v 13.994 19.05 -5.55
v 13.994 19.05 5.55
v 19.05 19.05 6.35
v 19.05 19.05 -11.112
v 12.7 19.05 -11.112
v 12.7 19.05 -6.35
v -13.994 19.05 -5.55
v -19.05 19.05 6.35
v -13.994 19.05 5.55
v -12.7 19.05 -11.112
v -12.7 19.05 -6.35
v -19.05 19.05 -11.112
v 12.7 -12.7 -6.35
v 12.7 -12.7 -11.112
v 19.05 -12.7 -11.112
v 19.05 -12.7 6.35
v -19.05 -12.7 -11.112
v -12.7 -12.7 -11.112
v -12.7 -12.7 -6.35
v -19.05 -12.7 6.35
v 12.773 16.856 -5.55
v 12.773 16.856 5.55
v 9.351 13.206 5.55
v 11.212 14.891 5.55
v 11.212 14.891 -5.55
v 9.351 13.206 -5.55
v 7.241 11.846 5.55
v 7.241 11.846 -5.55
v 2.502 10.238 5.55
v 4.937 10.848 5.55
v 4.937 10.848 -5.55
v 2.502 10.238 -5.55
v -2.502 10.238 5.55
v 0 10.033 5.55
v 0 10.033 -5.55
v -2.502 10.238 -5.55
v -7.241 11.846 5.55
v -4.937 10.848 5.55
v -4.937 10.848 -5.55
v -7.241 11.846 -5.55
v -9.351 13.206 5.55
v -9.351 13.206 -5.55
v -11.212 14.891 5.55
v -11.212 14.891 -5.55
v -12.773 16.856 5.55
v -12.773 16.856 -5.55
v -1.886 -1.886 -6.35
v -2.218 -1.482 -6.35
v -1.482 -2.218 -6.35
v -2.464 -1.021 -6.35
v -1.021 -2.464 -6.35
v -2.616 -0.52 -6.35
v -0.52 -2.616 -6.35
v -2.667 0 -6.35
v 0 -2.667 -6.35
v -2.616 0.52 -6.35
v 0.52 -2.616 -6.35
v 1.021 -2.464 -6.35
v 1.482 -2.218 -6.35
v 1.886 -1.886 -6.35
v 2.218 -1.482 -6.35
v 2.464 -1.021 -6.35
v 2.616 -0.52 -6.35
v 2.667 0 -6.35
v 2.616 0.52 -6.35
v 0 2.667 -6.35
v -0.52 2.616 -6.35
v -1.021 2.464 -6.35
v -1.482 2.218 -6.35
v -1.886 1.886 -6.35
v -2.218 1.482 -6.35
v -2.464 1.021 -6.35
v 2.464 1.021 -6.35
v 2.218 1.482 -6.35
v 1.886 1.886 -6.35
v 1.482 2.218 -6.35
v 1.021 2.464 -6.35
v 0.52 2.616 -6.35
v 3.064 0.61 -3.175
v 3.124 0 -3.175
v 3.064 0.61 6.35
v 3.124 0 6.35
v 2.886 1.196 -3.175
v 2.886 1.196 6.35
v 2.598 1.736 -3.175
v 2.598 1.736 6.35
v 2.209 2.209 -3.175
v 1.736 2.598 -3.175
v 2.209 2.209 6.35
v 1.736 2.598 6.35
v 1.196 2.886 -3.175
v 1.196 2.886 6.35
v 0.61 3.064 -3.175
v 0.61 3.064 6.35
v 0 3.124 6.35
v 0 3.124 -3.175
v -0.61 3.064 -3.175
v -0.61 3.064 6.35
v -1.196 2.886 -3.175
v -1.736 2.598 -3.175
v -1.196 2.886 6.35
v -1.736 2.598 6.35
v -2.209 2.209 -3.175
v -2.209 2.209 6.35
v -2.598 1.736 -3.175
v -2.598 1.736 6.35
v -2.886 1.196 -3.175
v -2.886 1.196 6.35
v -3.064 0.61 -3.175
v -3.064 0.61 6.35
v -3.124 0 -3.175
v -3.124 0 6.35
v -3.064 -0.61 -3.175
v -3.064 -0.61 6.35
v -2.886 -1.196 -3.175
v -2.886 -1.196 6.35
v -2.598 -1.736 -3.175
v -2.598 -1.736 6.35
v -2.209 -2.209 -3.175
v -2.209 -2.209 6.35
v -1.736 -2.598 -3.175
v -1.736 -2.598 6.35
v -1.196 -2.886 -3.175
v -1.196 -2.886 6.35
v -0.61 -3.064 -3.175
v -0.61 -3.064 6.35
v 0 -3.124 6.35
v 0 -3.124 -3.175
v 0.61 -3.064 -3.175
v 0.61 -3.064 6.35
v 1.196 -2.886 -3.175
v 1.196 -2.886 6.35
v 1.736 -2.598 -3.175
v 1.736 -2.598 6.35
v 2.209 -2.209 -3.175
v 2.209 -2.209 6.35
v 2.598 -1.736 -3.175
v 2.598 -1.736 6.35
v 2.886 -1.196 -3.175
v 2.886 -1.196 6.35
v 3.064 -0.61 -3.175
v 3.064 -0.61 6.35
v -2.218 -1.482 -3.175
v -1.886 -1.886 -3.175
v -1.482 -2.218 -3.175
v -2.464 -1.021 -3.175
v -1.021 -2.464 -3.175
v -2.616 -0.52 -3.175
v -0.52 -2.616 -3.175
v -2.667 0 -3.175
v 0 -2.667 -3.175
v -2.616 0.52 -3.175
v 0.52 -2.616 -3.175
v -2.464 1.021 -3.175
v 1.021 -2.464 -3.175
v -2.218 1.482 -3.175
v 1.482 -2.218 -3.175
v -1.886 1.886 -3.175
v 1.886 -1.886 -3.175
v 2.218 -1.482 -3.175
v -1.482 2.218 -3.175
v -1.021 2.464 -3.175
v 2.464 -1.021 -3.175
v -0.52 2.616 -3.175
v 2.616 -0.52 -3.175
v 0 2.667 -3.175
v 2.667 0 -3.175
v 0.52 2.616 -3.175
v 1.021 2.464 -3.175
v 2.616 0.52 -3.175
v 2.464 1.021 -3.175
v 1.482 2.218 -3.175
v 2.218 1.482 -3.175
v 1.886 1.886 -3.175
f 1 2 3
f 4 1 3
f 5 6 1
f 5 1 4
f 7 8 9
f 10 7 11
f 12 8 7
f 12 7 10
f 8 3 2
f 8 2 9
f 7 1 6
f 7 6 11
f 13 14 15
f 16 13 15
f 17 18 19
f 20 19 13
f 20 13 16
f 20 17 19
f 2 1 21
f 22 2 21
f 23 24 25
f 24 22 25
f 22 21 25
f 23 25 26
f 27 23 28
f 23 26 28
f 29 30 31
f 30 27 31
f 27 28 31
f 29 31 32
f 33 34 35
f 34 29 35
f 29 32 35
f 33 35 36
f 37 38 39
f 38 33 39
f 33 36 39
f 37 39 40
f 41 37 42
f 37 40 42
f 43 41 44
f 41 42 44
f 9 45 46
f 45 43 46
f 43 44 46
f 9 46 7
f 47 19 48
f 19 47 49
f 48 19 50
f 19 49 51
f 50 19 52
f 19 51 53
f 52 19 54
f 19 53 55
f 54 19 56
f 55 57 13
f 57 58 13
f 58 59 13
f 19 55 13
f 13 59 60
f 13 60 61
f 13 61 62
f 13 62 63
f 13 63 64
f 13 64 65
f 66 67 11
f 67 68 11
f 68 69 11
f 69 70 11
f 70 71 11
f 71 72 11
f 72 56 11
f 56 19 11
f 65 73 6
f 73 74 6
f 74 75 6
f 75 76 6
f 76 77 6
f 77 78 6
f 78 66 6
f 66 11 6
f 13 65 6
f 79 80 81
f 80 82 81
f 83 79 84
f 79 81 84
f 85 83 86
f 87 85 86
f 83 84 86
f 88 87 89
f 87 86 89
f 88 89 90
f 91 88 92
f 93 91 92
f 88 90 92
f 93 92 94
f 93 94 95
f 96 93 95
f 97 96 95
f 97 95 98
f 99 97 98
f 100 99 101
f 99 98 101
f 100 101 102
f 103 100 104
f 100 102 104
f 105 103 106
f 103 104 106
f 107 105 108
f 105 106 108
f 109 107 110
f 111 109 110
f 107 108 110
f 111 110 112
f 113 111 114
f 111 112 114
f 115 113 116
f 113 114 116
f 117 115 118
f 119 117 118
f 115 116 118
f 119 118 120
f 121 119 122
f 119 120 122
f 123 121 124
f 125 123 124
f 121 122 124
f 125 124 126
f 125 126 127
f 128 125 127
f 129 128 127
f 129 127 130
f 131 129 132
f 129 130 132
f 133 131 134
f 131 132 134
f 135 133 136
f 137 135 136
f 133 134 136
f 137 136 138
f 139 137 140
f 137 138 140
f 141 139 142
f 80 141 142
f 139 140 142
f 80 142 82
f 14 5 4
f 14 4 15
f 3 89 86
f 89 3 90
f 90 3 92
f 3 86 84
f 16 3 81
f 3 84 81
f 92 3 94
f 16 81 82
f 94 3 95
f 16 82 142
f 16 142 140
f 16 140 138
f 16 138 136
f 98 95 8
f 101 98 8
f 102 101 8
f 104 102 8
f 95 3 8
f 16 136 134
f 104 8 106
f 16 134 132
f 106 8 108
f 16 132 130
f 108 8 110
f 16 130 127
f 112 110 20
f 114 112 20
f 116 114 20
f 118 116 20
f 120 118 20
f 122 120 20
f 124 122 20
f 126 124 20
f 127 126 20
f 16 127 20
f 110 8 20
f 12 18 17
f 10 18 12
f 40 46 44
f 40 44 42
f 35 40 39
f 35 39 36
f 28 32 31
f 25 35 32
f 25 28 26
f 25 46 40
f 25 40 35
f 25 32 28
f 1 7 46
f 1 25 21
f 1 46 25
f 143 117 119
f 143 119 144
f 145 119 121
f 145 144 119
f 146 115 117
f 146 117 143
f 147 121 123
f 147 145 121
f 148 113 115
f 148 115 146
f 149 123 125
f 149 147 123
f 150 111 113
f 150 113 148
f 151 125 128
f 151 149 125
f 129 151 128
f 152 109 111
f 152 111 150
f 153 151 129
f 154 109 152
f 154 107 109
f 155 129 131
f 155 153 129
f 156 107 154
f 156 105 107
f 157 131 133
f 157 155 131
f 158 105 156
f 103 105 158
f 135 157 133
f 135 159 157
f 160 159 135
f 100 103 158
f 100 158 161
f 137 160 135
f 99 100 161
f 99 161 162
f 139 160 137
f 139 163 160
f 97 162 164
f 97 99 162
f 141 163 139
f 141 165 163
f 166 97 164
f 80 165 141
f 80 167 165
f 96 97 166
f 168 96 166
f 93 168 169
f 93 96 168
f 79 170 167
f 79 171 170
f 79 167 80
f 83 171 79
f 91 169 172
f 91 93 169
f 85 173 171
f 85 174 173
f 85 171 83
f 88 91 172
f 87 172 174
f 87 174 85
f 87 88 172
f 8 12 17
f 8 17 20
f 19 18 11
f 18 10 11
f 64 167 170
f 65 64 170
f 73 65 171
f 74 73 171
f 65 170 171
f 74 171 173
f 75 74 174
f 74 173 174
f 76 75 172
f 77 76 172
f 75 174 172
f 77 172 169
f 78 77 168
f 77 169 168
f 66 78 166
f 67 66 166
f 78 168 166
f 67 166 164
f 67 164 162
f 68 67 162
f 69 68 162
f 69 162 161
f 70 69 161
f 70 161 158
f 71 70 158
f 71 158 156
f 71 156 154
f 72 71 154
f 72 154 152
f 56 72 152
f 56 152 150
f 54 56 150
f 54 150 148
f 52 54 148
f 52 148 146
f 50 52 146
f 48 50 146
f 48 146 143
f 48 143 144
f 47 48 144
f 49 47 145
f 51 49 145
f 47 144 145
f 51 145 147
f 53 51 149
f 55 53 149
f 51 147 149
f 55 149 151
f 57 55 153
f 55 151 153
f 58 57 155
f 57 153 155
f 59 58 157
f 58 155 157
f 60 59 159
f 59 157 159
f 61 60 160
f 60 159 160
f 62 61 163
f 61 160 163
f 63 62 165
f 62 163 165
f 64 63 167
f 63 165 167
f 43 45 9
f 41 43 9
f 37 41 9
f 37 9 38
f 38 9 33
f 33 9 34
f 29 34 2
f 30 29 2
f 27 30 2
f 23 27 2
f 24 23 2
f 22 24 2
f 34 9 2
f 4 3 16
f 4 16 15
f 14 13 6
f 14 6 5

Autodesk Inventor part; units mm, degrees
ref_plane "YZ Plane" through (0, 0, 0) normal (1, 0, 0) x (0, 1, 0)
ref_plane "XZ Plane" through (0, 0, 0) normal (0, 1, 0) x (-1, 0, 0)
ref_plane "XY Plane" through (0, 0, 0) normal (0, 0, 1) x (1, 0, 0)
sketch "Sketch3" plane through (0, 0, 0) normal (0, 0, 1) x (1, 0, 0)
  line L0 (-12.7, -19.05) -> (12.7, -19.05)
  line L1 (12.7, -19.05) -> (12.7, 19.05)
  line L2 (12.7, 19.05) -> (-12.7, 19.05)
  line L3 (-12.7, 19.05) -> (-12.7, -19.05)
  line L4 (-12.7, -19.05) -> (12.7, 19.05) construction
  line L5 (12.7, -19.05) -> (-12.7, 19.05) construction
  point P0 (0, 0)
  dimension "d0" = 25.4
  dimension "d1" = 38.1
extrude "Extrusion1" add sketch "Sketch3" along normal mid plane 12.7
sketch "Sketch4" plane through (0, 0, 6.35) normal (0, 0, 1) x (1, 0, 0)
  circle A0 centre (0, 0) radius 2.667
  dimension "d4" = 5.334
extrude "Extrusion2" cut sketch "Sketch4" against normal through all
sketch "Sketch5" plane through (-12.7, -19.05, 6.35) normal (-1, 0, 0) x (0, 0, 1)
  line L0 (3.175, 6.35) -> (50.8, 6.35) projected
  line L1 (-12.7, 38.1) -> (-12.7, 0) projected
  line L2 (0, 0) -> (0, 38.1) projected
  line L3 (-12.7, 0) -> (0, 0)
  line L4 (0, 0) -> (0, 6.35)
  line L5 (0, 6.35) -> (-12.7, 6.35)
  line L6 (-12.7, 6.35) -> (-12.7, 0)
  point P0 (-6.35, 19.05)
  point P1 (-12.7, 6.35)
  dimension "d9" = 6.35
extrude "Extrusion3" cut sketch "Sketch5" against normal through all
sketch "Sketch8" plane through (-12.7, -12.7, -6.35) normal (-1, 0, 0) x (0, 0, 1)
  line L0 (-4.7625, 21.8398) -> (-4.7625, 13.2284) projected
  line L1 (12.7, 0) -> (12.7, 31.75) projected
  line L2 (12.7, 0) -> (-4.7625, 0)
  line L3 (-4.7625, 0) -> (-4.7625, 31.75)
  line L4 (-4.7625, 31.75) -> (12.7, 31.75)
  line L5 (12.7, 31.75) -> (12.7, 0)
  point P0 (6.35, 12.7)
  point P1 (-4.7625, 13.2284)
extrude "Extrusion5" add sketch "Sketch8" along normal blind 6.35
mirror "Mirror1" about plane through (0, 0, 0) normal (1, 0, 0) of "Extrusion5"
sketch "Sketch6" plane through (0, 0, 0) normal (0, 0, 1) x (1, 0, 0)
  circle A0 centre (0, 25.4) radius 15.367
  point P0 (0, 0)
  dimension "d10" = 25.4
  dimension "d13" = 30.734
extrude "cutOutForGuide" cut sketch "Sketch6" along normal mid plane 11.0998
sketch "Sketch9" plane through (0, 0, 6.35) normal (0, 0, 1) x (1, 0, 0)
  circle A0 centre (0, 0) radius 3.1242
  dimension "d16" = 6.2484
extrude "Extrusion6" cut sketch "Sketch9" against normal blind 9.525
properties part number "preventWireJumpingSingleSupport" material "PBT Plastic"
